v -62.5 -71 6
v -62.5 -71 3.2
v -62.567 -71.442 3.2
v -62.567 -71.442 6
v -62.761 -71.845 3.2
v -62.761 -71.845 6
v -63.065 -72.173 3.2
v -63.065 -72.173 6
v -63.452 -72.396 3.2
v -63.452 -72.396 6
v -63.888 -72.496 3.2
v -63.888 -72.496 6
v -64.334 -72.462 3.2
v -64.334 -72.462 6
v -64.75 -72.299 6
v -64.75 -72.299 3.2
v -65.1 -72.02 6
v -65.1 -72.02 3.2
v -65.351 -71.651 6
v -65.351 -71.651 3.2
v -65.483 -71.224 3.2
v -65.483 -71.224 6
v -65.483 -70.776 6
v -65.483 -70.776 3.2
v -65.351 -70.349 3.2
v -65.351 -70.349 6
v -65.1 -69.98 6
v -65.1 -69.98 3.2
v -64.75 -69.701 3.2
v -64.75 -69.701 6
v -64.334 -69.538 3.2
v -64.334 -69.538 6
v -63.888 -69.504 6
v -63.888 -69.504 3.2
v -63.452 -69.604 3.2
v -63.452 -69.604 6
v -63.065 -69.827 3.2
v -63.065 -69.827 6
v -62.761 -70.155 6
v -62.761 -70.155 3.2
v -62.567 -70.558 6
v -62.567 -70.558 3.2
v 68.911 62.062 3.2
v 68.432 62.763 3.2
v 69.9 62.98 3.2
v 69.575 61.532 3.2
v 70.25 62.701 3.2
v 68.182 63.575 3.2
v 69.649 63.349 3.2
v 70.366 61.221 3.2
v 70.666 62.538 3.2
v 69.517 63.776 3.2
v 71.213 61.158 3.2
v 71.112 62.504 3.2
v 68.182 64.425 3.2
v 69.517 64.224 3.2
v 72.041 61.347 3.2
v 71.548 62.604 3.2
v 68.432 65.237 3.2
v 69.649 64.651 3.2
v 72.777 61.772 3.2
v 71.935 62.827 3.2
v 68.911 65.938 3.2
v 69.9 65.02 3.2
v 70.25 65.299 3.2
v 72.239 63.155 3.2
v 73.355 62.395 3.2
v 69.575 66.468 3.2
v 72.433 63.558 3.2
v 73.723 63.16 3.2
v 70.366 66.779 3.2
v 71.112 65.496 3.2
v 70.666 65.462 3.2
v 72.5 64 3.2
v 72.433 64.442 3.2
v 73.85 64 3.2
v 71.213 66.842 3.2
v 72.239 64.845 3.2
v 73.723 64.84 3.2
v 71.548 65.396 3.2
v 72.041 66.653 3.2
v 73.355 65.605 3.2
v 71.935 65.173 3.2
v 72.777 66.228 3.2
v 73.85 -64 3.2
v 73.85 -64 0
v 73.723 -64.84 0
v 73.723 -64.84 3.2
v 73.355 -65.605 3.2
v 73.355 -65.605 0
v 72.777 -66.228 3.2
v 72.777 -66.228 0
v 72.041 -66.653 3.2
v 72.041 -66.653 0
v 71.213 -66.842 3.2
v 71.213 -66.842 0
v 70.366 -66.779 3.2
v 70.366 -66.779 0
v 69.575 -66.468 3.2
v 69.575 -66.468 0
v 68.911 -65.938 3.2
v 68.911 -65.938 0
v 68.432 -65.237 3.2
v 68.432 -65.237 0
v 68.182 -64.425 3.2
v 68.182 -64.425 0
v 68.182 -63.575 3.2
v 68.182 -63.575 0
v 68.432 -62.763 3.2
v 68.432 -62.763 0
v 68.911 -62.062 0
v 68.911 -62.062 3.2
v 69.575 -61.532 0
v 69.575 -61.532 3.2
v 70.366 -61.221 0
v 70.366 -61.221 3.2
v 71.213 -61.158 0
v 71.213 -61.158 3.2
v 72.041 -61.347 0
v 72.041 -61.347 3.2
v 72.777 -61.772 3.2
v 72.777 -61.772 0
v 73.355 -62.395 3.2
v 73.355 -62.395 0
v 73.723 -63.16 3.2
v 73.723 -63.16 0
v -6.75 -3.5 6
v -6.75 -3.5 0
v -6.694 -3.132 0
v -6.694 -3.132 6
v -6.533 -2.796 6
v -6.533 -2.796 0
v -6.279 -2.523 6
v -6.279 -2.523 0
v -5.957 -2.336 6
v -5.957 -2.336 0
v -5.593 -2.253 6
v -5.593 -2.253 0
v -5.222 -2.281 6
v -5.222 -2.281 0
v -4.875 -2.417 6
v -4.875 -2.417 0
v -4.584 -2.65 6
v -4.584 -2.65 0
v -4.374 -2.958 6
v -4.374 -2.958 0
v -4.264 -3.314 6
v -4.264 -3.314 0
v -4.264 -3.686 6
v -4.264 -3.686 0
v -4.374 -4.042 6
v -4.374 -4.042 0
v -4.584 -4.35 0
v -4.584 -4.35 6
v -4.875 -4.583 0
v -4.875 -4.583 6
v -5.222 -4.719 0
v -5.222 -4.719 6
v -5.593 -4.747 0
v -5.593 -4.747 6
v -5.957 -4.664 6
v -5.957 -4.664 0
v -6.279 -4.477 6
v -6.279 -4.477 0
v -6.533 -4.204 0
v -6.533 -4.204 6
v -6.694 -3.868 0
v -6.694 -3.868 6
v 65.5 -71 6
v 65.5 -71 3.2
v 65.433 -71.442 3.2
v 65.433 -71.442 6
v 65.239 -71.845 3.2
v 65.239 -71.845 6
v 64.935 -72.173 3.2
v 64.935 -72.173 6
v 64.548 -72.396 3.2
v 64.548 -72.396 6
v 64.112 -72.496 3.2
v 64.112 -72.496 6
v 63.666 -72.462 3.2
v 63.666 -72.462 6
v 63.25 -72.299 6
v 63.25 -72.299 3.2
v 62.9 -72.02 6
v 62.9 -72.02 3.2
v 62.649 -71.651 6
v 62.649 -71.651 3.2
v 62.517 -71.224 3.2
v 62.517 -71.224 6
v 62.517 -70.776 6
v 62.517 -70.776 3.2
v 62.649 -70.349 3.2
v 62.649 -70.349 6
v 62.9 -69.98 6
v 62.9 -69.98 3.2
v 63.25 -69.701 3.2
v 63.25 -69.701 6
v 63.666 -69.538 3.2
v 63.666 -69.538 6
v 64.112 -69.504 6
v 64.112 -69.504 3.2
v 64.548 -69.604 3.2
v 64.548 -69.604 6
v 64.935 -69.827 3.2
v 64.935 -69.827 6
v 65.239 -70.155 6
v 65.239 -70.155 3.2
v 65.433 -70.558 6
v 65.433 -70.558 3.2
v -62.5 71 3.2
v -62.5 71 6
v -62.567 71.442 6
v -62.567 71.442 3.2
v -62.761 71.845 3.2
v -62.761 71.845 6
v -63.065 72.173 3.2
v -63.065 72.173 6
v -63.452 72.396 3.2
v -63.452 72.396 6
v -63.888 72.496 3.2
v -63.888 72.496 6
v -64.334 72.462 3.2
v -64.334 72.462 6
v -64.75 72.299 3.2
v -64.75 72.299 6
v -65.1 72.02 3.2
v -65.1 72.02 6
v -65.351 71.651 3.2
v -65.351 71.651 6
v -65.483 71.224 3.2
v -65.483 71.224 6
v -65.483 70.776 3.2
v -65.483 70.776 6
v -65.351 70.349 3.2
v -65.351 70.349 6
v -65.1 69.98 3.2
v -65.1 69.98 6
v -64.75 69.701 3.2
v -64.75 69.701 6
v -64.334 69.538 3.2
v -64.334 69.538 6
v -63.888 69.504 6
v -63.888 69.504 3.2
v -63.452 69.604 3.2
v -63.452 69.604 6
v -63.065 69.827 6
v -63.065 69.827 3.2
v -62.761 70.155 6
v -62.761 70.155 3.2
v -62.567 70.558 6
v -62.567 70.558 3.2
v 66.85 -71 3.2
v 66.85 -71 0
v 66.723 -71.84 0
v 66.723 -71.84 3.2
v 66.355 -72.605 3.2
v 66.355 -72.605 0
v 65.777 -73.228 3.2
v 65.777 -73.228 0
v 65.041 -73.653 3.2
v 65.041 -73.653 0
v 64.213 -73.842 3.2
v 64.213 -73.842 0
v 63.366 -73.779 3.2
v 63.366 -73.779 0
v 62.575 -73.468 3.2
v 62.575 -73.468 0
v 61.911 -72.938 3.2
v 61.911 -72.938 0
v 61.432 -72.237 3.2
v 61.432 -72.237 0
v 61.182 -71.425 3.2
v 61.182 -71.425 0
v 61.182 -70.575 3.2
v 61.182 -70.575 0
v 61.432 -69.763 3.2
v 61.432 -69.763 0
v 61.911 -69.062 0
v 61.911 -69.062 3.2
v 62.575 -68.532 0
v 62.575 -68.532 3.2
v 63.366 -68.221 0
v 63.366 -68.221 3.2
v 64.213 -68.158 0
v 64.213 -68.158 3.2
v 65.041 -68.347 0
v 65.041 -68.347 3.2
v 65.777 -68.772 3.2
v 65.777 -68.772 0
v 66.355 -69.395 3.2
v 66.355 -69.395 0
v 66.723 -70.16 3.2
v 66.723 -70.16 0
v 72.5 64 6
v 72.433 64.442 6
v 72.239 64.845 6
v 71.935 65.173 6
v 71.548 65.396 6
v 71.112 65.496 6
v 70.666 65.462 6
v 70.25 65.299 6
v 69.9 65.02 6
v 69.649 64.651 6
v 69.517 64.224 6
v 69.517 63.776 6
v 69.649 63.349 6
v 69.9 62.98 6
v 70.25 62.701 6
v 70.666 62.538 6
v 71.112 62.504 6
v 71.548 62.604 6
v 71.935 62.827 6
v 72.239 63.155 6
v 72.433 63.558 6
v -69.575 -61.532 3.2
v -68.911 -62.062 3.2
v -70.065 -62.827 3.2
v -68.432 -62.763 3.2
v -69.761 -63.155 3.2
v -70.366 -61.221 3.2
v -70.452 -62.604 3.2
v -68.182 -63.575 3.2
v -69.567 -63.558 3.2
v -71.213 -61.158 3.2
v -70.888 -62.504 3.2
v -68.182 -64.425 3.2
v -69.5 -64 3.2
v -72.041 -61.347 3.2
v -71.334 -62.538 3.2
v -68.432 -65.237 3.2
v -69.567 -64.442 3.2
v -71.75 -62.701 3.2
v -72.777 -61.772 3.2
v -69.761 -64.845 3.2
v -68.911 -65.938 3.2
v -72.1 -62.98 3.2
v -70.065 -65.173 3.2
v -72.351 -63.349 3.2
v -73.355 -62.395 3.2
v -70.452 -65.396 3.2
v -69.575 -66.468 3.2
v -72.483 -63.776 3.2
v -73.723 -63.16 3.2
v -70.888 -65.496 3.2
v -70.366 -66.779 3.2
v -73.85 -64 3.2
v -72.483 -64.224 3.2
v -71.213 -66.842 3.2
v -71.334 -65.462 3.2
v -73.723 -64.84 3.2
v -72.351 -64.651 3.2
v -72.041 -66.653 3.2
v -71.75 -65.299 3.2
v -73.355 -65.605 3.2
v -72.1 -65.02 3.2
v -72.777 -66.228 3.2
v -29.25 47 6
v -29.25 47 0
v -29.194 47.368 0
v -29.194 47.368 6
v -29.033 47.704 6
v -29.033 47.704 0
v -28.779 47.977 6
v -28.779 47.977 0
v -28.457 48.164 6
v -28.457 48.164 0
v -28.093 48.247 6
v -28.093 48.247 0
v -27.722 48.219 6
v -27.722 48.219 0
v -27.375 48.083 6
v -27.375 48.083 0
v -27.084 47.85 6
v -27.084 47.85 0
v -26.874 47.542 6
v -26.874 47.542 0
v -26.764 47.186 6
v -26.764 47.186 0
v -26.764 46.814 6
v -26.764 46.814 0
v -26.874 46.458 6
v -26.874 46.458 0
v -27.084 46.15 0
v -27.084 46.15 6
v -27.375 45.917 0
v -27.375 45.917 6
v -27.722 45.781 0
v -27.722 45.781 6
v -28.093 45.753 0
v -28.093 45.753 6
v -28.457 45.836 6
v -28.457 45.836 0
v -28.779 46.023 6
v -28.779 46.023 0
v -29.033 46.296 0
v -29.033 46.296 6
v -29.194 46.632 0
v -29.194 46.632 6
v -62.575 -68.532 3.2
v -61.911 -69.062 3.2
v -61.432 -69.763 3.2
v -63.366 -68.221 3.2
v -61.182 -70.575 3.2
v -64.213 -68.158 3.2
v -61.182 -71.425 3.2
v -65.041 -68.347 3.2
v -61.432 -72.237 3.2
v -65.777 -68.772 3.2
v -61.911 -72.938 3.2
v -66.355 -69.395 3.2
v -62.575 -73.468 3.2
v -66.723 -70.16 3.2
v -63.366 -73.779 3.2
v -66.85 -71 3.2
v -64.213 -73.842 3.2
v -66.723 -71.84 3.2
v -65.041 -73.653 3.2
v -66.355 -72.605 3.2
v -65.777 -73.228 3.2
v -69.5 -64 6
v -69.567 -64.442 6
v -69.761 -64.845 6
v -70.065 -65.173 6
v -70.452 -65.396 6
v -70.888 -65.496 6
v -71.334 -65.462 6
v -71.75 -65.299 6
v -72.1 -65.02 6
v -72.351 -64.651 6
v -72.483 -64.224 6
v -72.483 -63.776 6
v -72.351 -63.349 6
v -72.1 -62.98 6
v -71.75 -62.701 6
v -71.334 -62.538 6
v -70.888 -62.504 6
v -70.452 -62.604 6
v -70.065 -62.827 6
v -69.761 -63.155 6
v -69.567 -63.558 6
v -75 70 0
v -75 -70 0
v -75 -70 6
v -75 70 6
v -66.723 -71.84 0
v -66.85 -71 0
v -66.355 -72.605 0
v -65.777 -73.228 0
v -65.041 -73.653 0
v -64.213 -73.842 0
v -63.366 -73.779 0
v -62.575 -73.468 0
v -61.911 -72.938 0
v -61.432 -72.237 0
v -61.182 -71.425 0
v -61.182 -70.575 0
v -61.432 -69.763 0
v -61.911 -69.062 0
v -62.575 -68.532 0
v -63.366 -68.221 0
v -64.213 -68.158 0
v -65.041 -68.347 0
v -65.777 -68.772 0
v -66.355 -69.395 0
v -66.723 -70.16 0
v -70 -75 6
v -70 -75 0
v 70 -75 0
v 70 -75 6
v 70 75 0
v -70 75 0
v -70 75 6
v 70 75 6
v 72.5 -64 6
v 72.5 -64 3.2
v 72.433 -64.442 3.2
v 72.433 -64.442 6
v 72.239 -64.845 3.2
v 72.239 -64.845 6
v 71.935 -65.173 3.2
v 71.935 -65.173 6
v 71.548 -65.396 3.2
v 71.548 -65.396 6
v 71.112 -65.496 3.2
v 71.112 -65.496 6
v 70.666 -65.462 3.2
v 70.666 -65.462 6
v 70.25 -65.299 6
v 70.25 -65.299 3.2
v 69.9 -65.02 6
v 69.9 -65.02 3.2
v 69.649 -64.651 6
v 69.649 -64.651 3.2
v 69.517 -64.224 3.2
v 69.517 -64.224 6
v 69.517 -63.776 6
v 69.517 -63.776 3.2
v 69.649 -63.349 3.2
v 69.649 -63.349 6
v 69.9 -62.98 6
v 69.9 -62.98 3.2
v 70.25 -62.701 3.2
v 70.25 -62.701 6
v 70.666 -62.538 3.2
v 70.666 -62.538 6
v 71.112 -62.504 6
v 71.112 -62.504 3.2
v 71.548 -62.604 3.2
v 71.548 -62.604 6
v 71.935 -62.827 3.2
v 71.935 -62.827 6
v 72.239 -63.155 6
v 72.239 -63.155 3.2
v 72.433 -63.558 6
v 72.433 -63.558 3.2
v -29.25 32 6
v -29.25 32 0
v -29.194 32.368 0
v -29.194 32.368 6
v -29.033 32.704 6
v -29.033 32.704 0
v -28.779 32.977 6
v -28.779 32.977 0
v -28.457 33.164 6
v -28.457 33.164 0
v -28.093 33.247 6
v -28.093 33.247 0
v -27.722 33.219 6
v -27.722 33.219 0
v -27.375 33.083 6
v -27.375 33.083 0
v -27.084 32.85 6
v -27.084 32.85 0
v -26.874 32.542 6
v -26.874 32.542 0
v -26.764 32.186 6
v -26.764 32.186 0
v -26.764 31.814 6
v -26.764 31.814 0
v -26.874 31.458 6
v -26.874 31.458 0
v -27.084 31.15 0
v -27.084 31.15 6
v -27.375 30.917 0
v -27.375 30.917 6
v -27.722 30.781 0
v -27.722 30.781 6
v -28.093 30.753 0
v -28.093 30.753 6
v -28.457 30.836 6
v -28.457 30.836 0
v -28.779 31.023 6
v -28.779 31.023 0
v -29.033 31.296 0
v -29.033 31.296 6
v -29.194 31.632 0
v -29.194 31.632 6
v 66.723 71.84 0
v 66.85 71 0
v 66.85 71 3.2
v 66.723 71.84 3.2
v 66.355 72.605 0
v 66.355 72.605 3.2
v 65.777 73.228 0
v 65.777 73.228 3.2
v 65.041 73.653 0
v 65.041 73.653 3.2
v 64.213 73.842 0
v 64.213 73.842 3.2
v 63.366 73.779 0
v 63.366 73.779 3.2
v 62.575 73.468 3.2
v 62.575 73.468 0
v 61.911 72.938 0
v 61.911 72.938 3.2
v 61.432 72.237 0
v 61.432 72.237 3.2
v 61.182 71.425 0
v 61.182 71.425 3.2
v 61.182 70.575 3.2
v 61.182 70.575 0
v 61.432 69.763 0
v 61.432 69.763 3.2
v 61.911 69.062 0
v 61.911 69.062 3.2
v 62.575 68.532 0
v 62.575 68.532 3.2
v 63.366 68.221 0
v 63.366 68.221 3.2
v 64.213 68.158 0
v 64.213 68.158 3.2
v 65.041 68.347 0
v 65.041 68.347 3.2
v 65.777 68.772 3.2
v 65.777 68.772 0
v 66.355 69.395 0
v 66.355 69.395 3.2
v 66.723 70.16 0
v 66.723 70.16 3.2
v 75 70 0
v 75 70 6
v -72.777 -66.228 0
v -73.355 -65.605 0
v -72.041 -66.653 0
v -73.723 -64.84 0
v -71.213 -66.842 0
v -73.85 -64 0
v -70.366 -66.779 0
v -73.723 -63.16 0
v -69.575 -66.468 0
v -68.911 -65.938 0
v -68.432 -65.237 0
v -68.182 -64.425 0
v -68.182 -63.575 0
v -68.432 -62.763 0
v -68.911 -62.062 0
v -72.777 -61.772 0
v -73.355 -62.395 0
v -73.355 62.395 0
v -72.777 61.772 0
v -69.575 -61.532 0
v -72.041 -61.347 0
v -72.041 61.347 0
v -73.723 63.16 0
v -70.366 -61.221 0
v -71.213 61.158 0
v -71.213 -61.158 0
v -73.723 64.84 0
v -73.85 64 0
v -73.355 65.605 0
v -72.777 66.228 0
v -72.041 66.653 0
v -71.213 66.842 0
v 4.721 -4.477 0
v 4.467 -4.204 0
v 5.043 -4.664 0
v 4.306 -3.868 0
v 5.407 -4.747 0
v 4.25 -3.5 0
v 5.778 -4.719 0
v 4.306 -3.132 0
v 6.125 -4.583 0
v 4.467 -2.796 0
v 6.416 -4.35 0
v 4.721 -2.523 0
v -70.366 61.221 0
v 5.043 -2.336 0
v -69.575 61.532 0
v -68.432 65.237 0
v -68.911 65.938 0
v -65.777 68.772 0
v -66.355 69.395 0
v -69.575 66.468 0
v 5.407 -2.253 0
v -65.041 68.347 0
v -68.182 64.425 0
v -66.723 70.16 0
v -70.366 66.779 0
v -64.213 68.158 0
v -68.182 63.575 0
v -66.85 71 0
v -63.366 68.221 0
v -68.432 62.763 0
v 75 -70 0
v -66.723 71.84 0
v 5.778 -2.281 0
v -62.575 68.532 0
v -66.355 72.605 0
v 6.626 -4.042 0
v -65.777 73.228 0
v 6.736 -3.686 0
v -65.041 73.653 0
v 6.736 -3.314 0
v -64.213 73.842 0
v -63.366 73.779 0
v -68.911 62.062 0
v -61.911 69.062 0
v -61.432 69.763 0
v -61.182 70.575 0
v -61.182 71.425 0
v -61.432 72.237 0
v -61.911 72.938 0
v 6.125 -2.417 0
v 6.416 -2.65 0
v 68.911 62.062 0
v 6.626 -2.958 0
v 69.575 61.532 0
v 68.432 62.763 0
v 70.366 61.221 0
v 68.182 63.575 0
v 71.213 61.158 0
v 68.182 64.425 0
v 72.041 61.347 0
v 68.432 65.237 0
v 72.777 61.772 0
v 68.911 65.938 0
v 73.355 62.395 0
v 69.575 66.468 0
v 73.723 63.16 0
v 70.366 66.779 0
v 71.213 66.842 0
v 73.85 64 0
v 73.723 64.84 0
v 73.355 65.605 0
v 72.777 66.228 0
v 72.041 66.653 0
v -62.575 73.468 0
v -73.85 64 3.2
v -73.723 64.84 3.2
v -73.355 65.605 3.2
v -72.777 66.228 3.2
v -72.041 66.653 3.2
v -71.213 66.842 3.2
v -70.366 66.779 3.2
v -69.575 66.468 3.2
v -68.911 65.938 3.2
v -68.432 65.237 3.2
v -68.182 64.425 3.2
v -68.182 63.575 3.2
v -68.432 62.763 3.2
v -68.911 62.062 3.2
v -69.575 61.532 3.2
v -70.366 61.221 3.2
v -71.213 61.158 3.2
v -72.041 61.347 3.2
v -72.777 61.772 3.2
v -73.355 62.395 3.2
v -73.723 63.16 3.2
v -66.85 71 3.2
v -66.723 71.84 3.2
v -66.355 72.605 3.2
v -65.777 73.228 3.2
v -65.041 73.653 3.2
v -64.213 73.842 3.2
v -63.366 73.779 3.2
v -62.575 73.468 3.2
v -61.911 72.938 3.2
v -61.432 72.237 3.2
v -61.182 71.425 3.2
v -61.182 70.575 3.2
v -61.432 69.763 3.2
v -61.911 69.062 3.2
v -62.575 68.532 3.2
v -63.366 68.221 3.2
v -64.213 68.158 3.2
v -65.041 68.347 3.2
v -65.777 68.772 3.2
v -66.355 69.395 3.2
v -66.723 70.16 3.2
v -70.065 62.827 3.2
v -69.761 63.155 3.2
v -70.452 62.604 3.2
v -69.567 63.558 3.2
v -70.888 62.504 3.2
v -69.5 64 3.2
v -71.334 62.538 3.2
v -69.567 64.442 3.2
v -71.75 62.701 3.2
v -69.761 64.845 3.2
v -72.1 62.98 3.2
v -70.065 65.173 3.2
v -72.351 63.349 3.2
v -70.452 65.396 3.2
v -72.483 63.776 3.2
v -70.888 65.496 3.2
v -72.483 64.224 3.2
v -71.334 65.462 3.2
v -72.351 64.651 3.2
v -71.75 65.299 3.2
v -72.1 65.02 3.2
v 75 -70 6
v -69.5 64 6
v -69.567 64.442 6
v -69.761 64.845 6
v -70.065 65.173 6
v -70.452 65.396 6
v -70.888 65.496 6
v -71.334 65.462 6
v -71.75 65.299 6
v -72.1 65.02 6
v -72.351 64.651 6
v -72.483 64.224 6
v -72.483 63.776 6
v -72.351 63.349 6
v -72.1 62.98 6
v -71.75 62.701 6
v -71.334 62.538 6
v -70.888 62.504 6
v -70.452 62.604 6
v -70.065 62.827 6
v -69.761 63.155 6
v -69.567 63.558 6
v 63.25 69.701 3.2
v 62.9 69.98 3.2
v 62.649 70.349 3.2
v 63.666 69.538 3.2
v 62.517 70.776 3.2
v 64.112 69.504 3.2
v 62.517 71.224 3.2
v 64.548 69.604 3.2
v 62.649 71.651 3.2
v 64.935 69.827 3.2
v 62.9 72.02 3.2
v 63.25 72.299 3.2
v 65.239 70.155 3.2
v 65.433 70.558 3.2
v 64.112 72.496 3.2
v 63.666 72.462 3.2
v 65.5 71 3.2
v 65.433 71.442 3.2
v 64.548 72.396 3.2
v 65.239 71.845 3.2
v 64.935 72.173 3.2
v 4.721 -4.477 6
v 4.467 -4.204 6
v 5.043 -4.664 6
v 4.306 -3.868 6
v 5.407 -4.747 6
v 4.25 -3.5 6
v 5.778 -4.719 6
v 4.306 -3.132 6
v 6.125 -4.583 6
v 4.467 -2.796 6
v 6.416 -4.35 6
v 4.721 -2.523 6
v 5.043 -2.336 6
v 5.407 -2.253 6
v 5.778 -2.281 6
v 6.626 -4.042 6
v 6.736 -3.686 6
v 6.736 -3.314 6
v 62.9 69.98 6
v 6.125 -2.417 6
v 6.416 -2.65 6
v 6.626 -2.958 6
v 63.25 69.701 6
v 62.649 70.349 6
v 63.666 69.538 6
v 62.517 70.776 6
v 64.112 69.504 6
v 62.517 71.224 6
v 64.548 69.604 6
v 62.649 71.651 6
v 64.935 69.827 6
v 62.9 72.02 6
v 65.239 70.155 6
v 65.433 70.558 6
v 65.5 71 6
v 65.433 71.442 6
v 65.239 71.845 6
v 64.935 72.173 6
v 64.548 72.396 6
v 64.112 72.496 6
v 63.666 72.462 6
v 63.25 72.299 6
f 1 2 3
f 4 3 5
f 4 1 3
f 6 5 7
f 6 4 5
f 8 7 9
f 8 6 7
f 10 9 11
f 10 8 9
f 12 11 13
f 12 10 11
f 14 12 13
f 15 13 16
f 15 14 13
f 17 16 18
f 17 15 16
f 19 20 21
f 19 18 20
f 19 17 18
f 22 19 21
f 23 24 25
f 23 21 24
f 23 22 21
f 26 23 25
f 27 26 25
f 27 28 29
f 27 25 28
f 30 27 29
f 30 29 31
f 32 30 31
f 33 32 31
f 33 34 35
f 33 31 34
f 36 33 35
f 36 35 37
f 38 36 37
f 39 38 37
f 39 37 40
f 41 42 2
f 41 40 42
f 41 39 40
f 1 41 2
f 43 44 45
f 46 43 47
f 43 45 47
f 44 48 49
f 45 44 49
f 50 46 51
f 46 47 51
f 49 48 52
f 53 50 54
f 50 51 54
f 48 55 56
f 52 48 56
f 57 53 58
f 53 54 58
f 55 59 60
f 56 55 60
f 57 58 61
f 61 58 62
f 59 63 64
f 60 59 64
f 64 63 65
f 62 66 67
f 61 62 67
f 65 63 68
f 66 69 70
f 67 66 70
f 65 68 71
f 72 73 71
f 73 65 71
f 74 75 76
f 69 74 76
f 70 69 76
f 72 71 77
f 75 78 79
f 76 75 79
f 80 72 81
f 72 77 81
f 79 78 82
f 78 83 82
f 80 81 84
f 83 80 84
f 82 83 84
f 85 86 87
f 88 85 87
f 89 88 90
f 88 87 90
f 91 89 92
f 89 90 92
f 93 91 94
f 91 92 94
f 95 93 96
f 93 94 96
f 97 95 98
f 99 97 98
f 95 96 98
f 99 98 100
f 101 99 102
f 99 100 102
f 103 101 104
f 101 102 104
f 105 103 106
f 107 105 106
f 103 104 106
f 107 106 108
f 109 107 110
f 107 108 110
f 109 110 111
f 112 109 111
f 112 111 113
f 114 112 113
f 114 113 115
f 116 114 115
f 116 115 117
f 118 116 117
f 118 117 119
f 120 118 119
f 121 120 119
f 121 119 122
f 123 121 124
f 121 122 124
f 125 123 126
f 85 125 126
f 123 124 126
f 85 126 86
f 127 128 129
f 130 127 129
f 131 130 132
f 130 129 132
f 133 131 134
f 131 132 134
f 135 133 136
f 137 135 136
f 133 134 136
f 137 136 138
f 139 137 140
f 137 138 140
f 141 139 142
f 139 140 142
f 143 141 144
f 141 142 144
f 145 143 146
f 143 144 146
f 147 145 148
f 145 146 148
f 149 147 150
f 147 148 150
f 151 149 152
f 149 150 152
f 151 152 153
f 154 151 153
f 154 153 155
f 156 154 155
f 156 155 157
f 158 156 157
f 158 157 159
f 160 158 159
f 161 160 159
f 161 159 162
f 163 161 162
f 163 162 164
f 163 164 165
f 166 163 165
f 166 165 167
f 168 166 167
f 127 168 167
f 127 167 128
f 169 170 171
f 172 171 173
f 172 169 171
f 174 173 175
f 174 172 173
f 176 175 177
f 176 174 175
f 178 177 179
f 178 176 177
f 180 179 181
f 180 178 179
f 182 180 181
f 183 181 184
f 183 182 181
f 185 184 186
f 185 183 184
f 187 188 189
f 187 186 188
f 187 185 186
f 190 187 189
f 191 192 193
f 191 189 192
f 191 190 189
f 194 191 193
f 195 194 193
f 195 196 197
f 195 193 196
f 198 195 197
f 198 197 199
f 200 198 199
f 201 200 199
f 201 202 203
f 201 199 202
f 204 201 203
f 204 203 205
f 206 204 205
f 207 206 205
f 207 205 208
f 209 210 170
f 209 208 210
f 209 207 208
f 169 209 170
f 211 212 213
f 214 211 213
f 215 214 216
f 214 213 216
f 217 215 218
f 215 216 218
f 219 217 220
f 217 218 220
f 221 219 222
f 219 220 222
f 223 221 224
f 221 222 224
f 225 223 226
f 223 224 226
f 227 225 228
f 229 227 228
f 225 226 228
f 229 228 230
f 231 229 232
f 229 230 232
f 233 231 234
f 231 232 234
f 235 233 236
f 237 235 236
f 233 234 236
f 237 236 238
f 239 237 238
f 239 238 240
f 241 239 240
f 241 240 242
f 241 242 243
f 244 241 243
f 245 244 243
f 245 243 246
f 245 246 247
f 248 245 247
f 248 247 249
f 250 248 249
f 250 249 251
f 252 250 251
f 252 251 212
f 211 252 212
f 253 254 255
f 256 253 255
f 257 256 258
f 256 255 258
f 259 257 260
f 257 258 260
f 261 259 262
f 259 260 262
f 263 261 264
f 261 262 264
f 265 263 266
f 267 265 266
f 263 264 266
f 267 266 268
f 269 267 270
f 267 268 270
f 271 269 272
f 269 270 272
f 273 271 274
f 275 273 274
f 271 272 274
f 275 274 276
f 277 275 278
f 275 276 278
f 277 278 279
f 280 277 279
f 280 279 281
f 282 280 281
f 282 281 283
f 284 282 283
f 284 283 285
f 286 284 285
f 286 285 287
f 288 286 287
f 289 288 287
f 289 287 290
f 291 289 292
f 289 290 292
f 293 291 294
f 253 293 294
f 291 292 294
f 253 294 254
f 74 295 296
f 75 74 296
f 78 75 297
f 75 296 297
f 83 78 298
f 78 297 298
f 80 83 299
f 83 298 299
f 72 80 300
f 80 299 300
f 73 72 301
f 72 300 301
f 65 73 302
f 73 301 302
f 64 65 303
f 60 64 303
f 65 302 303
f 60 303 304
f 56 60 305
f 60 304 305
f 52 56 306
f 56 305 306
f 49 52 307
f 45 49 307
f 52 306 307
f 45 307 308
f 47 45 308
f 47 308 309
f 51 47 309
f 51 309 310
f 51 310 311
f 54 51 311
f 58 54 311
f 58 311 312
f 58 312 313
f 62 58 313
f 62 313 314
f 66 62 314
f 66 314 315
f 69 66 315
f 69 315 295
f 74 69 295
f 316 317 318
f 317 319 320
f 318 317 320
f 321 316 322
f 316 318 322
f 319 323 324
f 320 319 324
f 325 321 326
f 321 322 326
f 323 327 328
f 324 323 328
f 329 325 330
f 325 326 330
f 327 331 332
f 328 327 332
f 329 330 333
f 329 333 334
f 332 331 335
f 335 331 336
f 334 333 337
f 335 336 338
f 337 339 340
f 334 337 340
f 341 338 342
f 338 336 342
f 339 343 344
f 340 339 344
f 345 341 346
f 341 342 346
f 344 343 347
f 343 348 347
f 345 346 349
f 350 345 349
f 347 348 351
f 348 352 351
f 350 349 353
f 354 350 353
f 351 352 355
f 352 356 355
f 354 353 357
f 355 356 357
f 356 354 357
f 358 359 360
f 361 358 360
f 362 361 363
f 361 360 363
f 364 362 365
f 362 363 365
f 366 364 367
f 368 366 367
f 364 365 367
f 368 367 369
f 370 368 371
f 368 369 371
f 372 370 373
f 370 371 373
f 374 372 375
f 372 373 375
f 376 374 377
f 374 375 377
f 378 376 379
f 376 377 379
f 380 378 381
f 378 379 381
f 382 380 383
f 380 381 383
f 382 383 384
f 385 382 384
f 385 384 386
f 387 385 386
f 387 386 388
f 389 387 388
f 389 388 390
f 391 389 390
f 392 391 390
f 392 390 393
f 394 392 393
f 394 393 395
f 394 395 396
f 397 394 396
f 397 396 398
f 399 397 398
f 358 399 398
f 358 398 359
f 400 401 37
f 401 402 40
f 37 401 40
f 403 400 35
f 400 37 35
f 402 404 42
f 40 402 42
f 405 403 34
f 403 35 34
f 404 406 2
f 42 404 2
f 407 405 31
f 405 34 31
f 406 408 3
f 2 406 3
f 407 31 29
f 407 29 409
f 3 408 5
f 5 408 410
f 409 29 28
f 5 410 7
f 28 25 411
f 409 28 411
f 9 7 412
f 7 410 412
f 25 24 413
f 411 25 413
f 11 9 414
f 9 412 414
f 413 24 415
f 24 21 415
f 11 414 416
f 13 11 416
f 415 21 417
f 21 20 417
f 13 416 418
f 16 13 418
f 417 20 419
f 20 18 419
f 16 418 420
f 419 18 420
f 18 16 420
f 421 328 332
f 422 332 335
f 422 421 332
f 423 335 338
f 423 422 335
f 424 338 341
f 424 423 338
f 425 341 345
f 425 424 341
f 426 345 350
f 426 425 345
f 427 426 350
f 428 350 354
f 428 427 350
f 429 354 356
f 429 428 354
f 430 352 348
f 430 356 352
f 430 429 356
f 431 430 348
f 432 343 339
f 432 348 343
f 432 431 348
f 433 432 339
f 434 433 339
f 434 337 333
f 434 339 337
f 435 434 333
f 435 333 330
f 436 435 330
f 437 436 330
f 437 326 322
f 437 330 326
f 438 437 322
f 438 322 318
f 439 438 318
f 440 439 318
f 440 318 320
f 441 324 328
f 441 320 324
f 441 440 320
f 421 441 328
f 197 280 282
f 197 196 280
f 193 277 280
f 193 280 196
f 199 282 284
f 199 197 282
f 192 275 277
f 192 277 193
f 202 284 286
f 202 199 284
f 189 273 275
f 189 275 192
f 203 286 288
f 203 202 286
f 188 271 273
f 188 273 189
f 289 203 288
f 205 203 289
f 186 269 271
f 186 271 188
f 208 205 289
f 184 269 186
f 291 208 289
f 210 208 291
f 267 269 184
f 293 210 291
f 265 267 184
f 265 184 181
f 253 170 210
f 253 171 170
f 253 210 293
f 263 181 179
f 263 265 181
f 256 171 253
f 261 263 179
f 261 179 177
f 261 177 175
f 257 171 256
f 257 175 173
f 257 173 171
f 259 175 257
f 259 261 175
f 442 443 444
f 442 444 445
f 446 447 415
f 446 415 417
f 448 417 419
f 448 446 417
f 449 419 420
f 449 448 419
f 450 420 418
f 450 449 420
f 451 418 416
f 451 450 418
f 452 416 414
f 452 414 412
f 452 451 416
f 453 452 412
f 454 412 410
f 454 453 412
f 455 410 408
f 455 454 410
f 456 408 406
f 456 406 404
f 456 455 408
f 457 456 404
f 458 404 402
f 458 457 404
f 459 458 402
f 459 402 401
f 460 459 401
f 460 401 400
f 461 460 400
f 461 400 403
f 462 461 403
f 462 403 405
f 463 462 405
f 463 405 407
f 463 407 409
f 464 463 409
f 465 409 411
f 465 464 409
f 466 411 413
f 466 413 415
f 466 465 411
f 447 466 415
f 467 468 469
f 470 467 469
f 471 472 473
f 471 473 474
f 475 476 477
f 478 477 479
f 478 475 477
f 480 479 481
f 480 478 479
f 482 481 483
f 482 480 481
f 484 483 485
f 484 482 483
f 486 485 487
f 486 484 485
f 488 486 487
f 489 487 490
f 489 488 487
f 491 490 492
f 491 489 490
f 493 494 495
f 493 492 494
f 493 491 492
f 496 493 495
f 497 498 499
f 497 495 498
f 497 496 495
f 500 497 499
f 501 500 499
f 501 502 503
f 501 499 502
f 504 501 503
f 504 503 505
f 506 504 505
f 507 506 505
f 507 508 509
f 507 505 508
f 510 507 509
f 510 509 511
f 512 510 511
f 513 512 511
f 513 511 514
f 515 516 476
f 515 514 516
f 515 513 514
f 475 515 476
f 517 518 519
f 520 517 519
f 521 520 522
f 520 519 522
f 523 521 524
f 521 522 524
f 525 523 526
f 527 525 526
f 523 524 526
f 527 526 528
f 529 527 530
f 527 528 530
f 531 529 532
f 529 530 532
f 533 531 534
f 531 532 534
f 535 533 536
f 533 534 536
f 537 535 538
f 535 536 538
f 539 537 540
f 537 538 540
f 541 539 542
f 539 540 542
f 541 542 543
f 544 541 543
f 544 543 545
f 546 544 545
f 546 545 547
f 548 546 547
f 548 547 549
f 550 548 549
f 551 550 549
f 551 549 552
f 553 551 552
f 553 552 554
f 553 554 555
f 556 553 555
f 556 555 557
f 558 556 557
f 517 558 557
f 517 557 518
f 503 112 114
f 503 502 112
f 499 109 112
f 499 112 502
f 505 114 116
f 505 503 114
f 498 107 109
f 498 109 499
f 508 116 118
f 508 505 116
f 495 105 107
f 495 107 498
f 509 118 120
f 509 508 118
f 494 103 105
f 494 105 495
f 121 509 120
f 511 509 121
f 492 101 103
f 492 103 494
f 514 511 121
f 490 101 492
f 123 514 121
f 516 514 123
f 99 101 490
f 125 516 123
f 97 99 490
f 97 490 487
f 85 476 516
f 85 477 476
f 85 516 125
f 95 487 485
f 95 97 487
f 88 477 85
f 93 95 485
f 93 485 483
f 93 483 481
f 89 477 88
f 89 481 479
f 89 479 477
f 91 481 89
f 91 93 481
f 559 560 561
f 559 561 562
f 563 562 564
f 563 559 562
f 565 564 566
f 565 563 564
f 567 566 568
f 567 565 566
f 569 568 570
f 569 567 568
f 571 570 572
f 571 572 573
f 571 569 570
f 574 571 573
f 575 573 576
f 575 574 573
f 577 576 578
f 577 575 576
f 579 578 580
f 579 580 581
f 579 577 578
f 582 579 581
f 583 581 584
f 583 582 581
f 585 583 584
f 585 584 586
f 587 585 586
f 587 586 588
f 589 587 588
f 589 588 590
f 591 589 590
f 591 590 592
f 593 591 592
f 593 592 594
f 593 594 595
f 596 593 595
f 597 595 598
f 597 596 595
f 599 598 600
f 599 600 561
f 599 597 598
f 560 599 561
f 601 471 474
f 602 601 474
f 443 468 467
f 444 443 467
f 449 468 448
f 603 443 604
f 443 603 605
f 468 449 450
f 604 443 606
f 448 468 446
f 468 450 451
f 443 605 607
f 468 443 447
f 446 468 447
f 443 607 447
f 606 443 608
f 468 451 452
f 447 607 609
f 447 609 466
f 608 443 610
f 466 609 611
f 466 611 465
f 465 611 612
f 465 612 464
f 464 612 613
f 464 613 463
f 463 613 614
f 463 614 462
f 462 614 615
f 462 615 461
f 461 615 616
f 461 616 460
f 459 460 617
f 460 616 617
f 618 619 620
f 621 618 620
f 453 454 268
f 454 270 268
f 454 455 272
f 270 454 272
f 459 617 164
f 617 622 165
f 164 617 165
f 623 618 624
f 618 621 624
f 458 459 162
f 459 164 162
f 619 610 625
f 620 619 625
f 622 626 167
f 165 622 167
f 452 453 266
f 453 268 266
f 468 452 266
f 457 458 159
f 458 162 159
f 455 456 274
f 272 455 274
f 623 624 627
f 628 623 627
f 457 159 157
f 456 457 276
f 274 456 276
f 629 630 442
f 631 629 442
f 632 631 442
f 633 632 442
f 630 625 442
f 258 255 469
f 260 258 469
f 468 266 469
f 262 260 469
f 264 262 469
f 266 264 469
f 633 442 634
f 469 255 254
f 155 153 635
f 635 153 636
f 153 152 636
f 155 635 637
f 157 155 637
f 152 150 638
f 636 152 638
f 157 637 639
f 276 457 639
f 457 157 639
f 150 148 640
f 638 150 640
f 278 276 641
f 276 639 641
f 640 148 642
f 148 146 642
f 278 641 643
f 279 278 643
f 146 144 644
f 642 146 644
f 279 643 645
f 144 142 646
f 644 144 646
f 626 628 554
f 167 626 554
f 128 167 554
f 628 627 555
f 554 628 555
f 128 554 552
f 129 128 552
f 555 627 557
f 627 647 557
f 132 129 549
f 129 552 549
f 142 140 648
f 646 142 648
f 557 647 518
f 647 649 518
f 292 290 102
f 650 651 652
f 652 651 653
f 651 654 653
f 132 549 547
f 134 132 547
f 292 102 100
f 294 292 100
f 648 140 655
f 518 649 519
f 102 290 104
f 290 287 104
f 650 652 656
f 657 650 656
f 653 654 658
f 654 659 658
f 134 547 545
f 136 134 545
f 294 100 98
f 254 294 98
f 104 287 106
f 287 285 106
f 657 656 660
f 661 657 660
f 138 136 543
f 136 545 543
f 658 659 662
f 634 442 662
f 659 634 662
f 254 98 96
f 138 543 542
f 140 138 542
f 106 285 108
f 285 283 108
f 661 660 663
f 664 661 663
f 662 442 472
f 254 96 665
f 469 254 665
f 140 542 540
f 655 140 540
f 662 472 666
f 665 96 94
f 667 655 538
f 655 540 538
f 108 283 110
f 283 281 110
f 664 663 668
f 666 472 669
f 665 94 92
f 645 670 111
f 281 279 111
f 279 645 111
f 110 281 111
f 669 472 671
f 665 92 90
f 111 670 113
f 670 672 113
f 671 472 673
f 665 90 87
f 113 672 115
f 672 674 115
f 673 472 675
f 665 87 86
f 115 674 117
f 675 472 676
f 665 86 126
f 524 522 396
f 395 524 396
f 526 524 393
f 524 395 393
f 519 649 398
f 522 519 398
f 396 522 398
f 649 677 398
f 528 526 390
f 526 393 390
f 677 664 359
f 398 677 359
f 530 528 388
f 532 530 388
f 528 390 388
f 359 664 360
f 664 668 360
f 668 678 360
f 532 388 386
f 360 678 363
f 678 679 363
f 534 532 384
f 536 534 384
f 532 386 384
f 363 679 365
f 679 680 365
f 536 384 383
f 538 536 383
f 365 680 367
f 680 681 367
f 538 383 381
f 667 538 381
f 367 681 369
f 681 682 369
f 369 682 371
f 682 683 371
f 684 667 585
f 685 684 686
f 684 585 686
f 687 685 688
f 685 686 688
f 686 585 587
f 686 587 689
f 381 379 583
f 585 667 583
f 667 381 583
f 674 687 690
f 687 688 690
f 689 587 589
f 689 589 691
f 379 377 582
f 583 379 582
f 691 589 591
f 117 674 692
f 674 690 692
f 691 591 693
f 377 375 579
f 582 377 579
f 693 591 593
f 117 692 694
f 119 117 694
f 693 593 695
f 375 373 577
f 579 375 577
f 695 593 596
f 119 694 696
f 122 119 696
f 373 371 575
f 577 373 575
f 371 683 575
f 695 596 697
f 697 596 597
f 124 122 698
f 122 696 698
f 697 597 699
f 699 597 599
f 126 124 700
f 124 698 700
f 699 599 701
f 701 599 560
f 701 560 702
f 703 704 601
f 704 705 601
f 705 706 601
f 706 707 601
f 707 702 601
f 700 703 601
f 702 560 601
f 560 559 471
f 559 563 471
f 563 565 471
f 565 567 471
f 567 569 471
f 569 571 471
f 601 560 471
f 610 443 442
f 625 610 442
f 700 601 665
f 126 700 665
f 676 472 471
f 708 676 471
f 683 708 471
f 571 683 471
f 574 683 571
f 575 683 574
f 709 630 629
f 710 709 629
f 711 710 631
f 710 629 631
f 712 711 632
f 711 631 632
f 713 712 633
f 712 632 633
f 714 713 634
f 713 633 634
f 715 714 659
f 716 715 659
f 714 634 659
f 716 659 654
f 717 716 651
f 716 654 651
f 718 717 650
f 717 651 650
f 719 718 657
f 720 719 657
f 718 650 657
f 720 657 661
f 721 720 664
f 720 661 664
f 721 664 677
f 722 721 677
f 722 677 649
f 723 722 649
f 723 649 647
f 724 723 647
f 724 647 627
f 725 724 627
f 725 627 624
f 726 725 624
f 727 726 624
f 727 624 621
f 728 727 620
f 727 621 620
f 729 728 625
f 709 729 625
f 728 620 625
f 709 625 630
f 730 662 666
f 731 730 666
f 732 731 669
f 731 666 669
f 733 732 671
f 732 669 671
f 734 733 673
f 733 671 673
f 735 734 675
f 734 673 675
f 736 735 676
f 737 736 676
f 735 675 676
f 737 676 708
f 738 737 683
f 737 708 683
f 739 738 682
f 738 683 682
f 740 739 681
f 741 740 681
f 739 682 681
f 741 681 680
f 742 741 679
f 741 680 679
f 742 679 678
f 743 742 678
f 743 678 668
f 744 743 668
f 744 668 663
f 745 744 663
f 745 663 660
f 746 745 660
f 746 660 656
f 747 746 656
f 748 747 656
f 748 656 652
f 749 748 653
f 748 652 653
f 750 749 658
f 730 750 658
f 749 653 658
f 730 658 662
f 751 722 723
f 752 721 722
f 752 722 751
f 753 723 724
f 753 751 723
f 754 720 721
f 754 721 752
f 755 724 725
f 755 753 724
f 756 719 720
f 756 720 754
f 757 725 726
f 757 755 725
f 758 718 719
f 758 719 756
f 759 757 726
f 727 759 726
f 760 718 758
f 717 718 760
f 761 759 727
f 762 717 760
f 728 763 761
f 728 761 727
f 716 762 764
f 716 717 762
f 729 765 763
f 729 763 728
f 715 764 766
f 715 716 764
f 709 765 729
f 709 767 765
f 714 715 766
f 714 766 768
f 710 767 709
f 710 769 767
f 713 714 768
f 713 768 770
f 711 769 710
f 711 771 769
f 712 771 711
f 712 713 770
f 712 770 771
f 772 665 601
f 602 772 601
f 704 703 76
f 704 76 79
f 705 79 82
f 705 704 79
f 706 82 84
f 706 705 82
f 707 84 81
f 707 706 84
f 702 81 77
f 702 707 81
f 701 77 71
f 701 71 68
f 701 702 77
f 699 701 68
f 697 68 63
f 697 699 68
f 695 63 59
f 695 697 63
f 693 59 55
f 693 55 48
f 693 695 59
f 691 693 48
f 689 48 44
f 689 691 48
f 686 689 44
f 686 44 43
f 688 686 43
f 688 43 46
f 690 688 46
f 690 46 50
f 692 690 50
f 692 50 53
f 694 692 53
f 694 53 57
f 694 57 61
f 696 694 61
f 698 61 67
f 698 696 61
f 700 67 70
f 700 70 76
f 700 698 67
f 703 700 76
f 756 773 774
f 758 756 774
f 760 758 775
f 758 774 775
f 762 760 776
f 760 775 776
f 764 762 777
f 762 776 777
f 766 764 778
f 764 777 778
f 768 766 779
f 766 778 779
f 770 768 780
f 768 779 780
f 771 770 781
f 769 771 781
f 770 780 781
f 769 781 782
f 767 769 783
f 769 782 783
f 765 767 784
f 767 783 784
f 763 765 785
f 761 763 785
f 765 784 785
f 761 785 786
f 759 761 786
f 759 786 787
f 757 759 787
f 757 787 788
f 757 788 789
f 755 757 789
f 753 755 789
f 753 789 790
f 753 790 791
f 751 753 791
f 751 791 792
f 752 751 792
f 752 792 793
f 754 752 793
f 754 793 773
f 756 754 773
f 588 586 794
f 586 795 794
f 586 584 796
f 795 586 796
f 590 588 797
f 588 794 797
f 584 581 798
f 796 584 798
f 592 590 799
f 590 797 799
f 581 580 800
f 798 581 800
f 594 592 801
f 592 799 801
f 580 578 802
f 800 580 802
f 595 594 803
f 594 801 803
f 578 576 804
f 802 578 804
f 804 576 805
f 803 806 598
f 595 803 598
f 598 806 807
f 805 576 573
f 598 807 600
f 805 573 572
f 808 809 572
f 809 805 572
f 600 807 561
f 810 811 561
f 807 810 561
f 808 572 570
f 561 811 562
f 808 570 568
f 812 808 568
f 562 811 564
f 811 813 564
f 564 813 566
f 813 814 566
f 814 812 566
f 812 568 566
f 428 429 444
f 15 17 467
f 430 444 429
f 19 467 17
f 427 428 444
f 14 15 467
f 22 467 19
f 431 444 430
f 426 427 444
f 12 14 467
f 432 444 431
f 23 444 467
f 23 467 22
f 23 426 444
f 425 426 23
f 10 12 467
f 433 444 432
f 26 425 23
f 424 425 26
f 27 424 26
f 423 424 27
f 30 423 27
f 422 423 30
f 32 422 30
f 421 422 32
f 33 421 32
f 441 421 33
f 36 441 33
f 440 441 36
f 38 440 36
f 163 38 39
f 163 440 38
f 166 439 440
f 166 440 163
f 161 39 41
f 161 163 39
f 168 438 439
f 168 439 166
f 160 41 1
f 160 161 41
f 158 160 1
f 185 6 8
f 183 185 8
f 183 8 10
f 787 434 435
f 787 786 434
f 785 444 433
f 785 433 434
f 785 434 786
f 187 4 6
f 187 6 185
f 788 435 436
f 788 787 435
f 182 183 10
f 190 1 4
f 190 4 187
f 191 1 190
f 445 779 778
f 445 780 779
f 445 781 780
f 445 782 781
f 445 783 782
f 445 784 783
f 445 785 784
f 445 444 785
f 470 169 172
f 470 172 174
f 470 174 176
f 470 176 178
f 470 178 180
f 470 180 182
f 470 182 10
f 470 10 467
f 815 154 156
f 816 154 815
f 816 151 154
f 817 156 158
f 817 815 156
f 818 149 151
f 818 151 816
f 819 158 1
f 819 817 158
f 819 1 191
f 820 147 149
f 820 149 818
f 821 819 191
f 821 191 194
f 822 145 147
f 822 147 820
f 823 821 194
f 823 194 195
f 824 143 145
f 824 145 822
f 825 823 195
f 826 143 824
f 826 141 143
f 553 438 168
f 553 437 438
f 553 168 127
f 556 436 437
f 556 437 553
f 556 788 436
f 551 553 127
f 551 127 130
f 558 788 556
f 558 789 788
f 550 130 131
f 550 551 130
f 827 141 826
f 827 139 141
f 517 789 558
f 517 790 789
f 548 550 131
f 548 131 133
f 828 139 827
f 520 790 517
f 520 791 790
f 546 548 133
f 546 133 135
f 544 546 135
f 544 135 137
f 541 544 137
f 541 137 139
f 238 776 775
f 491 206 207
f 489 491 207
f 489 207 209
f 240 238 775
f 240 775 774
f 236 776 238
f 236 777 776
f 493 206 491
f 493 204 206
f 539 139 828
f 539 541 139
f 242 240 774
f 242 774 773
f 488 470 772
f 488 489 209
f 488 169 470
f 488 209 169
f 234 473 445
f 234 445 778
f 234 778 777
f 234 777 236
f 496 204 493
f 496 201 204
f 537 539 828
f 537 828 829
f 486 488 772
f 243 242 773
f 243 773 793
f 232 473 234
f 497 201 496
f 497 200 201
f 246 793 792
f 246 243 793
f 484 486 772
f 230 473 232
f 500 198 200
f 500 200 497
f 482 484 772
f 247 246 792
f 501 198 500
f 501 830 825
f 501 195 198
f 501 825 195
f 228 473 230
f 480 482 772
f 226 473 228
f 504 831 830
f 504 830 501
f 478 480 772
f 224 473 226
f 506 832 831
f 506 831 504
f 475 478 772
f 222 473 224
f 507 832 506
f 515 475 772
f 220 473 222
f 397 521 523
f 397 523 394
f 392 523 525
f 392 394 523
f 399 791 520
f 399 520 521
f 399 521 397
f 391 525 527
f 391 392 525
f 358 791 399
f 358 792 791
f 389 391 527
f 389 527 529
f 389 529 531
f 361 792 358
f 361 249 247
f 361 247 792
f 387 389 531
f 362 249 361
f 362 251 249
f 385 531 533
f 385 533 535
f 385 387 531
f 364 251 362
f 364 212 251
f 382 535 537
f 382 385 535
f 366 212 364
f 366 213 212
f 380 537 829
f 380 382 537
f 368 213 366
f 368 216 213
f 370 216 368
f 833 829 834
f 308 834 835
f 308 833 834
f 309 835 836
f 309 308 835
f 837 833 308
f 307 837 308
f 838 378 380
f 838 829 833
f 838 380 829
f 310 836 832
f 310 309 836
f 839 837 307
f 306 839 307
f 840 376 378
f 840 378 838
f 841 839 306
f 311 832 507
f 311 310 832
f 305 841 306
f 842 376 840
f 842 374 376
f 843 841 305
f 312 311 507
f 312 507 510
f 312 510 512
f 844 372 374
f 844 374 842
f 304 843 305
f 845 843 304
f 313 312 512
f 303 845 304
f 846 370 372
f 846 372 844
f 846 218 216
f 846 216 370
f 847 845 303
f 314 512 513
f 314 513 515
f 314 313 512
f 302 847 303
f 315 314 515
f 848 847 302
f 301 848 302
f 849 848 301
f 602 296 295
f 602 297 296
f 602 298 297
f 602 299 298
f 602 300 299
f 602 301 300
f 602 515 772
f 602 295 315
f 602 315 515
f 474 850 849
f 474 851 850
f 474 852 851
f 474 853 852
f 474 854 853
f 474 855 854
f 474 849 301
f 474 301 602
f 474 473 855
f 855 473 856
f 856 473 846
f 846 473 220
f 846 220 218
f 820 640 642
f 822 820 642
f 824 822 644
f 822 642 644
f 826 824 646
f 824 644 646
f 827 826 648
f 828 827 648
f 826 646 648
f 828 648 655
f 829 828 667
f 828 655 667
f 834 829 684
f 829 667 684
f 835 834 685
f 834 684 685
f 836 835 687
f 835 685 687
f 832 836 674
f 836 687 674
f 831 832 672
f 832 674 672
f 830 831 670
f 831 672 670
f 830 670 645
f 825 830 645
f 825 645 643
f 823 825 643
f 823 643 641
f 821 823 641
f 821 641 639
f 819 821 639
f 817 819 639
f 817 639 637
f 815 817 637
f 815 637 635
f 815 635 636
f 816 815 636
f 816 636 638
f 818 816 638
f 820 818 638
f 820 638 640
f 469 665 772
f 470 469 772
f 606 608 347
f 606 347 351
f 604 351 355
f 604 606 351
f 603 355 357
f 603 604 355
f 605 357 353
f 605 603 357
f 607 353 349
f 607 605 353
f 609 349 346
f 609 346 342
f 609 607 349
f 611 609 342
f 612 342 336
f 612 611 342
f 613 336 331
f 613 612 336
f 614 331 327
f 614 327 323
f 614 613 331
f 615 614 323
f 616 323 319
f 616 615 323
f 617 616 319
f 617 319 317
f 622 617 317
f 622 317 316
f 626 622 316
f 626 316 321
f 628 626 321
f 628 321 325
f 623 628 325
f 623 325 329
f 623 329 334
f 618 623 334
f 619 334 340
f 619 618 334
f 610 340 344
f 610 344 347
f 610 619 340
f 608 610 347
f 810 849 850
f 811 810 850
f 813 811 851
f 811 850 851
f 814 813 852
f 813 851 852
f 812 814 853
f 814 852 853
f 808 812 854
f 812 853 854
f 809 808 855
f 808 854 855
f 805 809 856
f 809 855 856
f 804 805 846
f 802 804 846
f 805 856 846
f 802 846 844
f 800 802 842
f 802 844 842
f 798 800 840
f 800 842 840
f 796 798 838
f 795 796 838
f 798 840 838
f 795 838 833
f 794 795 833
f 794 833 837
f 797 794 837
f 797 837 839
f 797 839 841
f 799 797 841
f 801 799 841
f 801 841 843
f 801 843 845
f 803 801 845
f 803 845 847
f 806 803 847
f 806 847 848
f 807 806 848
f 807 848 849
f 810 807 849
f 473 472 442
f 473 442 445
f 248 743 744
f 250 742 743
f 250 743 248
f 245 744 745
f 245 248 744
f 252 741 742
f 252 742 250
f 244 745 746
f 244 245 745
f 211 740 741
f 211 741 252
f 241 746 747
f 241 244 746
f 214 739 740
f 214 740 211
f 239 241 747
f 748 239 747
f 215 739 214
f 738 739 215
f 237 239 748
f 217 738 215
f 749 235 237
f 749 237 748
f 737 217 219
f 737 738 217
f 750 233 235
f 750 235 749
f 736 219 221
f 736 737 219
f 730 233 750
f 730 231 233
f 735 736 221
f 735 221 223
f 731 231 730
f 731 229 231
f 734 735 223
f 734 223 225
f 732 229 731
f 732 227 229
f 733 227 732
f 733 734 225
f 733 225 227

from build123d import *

# Parameters (mm, degrees)
SKETCH_1_W               = 150
SKETCH_1_H               = 150
EXTRUDE_1_DEPTH          = 6
CHAMFER_1_SIZE           = 5
SKETCH_2_R               = 1.5
CUT_EXTRUDE_1_DEPTH      = 10
SKETCH_3_R               = 2.85
CUT_EXTRUDE_2_DEPTH      = 3.2
MIRROR_2_COPY_1_SKETCH_R = 2.85
MIRROR_2_COPY_1_DEPTH    = 3.2
HOLE_WIZARD_M3_1_D       = 2.5
HOLE_WIZARD_M3_1_DEPTH   = 7.5
HOLE_WIZARD_M3_1_TIP     = 0.751075774
HOLE_WIZARD_M3_2_D       = 2.5
HOLE_WIZARD_M3_2_DEPTH   = 7.5
HOLE_WIZARD_M3_2_TIP     = 0.751075774


with BuildPart() as part:
    # 草图1 → 凸台-拉伸1 (new body)
    with BuildSketch(Plane.XY):
        Rectangle(SKETCH_1_W, SKETCH_1_H)
    extrude(amount=EXTRUDE_1_DEPTH)

    # 倒角1
    chamfer_1_edges = [part.edges().sort_by_distance(p)[0] for p in [
        (-75, 75, 3),
        (75, 75, 3),
        (75, -75, 3),
        (-75, -75, 3),
    ]]
    chamfer(chamfer_1_edges, length=CHAMFER_1_SIZE)

    # 草图2 → 切除-拉伸1 (cut)
    with BuildSketch(Plane.XY.offset(6)):
        with Locations((64, 71)):
            Circle(SKETCH_2_R)
        with Locations((71, 64)):
            Circle(SKETCH_2_R)
        with Locations((-71, 64)):
            Circle(SKETCH_2_R)
        with Locations((-64, 71)):
            Circle(SKETCH_2_R)
    cut_extrude_1 = extrude(amount=-CUT_EXTRUDE_1_DEPTH, mode=Mode.SUBTRACT)

    # 草图3 → 切除-拉伸2 (cut)
    with BuildSketch(Plane(origin=(0, 0, 0), x_dir=(-1, 0, 0), z_dir=(0, 0, -1))):
        with Locations((64, 71)):
            Circle(SKETCH_3_R)
        with Locations((71, 64)):
            Circle(SKETCH_3_R)
    cut_extrude_2 = extrude(amount=-CUT_EXTRUDE_2_DEPTH, mode=Mode.SUBTRACT)

    # 镜向1: 切除-拉伸2 across plane
    add(cut_extrude_2.mirror(Plane(origin=(0, 0, 0), x_dir=(0, 0, 1), z_dir=(1, 0, 0))), mode=Mode.SUBTRACT)

    # 镜向2: 切除-拉伸1, 切除-拉伸2 across plane
    add(cut_extrude_1.mirror(Plane.ZX), mode=Mode.SUBTRACT)
    add(cut_extrude_2.mirror(Plane.ZX), mode=Mode.SUBTRACT)

    # 镜向2 copy 1 sketch → 镜向2 copy 1 (cut)
    with BuildSketch(Plane(origin=(0, 0, 0), x_dir=(1, 0, 0), z_dir=(0, 0, -1))):
        with Locations((64, 71)):
            Circle(MIRROR_2_COPY_1_SKETCH_R)
        with Locations((71, 64)):
            Circle(MIRROR_2_COPY_1_SKETCH_R)
    extrude(amount=-MIRROR_2_COPY_1_DEPTH, mode=Mode.SUBTRACT)

    # M3 螺纹孔1
    with Locations(Plane.XY.offset(6)):
        with Locations((-5.5, -3.5), (5.5, -3.5)):
            Hole(HOLE_WIZARD_M3_1_D / 2, depth=HOLE_WIZARD_M3_1_DEPTH)
            with Locations((0, 0, -(HOLE_WIZARD_M3_1_DEPTH + HOLE_WIZARD_M3_1_TIP / 2))):  # 118° drill point
                Cone(0, HOLE_WIZARD_M3_1_D / 2, HOLE_WIZARD_M3_1_TIP, mode=Mode.SUBTRACT)

    # M3 螺纹孔2
    with Locations(Plane.XY.offset(6)):
        with Locations((-28, 47), (-28, 32)):
            Hole(HOLE_WIZARD_M3_2_D / 2, depth=HOLE_WIZARD_M3_2_DEPTH)
            with Locations((0, 0, -(HOLE_WIZARD_M3_2_DEPTH + HOLE_WIZARD_M3_2_TIP / 2))):  # 118° drill point
                Cone(0, HOLE_WIZARD_M3_2_D / 2, HOLE_WIZARD_M3_2_TIP, mode=Mode.SUBTRACT)


solid = part.part
